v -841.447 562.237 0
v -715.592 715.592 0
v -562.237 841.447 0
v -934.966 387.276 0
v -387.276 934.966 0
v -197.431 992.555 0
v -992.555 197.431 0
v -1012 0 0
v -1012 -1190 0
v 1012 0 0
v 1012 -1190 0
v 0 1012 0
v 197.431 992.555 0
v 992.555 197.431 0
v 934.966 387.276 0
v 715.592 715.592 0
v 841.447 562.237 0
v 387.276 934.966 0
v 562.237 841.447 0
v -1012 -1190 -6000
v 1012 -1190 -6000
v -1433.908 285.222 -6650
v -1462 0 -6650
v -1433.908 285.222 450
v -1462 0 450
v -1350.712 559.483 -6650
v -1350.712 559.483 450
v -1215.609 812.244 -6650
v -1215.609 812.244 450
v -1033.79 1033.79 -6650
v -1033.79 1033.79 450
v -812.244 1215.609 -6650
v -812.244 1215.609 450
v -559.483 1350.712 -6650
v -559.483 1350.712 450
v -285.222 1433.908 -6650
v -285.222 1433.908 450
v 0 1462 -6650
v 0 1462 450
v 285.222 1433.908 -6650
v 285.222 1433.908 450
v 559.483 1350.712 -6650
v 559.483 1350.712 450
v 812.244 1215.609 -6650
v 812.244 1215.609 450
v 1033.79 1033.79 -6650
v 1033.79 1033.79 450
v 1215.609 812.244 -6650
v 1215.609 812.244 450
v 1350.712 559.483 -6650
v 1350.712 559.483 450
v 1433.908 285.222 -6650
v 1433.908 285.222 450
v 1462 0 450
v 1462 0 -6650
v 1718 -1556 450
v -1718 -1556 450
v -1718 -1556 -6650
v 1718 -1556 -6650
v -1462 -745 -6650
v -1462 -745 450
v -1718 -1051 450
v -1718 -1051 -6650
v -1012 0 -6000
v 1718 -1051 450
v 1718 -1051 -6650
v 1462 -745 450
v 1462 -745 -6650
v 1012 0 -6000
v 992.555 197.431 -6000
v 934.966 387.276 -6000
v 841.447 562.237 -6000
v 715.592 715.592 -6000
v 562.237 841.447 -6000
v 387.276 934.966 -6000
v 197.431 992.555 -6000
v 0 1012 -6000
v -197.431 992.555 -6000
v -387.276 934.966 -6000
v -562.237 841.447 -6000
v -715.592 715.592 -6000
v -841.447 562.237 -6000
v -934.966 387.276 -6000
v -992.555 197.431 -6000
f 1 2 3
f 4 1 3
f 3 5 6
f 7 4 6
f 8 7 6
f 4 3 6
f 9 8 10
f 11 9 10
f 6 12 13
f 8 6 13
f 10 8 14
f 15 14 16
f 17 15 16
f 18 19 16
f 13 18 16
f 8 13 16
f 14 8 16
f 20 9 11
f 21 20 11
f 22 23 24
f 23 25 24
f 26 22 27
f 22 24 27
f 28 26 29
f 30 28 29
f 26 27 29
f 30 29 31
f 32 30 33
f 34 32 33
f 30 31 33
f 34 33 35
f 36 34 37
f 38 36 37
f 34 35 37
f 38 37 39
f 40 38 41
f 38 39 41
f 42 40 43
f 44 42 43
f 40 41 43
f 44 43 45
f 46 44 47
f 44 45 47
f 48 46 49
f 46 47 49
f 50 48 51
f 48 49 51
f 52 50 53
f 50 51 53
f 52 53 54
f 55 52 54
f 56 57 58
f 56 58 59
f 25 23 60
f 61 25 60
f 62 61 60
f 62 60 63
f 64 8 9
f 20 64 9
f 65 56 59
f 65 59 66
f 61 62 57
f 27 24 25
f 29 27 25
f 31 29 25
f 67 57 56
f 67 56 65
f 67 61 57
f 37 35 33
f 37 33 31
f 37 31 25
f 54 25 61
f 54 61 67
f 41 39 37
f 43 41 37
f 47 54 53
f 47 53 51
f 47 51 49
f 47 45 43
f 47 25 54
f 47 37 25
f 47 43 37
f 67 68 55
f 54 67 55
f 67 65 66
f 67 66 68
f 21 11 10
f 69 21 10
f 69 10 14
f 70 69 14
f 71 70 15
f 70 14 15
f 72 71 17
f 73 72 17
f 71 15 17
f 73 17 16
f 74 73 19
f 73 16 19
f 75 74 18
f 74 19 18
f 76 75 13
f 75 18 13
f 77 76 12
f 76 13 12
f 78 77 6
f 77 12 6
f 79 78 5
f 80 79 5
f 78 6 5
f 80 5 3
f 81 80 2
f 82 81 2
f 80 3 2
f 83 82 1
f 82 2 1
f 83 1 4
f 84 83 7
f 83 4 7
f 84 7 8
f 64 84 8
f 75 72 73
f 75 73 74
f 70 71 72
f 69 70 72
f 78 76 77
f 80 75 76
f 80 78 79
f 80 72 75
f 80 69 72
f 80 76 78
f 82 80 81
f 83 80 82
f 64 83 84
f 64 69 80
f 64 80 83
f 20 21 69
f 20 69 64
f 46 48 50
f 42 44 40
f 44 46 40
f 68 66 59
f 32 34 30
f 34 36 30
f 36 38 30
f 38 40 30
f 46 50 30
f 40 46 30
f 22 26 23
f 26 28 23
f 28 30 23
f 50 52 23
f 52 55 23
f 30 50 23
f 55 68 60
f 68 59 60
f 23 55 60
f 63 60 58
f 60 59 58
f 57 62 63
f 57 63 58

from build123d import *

# Parameters (mm, degrees)
PAD_DEPTH    = 6000
PAD001_DEPTH = 450
PAD002_DEPTH = 650


with BuildPart() as part:
    # Sketch → Pad (new body)
    with BuildSketch(Plane.XY):
        with BuildLine():
            ThreePointArc((1462, 0), (0, 1462), (-1462, 0))
            Line((-1462, 0), (-1462, -745))
            Line((-1462, -745), (-1718, -1051))
            Line((-1718, -1051), (-1718, -1556))
            Line((-1718, -1556), (1718, -1556))
            Line((1718, -1556), (1718, -1051))
            Line((1718, -1051), (1462, -745))
            Line((1462, -745), (1462, 0))
        make_face()
        with BuildLine():
            ThreePointArc((1012, 0), (0, 1012), (-1012, 0))
            Line((-1012, 0), (-1012, -1190))
            Line((-1012, -1190), (1012, -1190))
            Line((1012, -1190), (1012, 0))
        make_face(mode=Mode.SUBTRACT)
    extrude(amount=-PAD_DEPTH)

    # Sketch001 (on Face13 of Pad) → Pad001 (join)
    with BuildSketch(Plane.XY):
        with BuildLine():
            Line((-1462, 0), (-1462, -745))
            Line((-1462, -745), (-1718, -1051))
            Line((-1718, -1051), (-1718, -1556))
            Line((-1718, -1556), (1718, -1556))
            Line((1718, -1556), (1718, -1051))
            Line((1718, -1051), (1462, -745))
            Line((1462, -745), (1462, 0))
            ThreePointArc((1462, 0), (0, 1462), (-1462, 0))
        make_face()
    extrude(amount=PAD001_DEPTH)

    # Sketch002 (on Face1 of Pad001) → Pad002 (join)
    with BuildSketch(Plane(origin=(0, 0, -6000), x_dir=(1, 0, 0), z_dir=(0, 0, -1))):
        with BuildLine():
            Line((-1462, 0), (-1462, 745))
            Line((-1462, 745), (-1718, 1051))
            Line((-1718, 1051), (-1718, 1556))
            Line((-1718, 1556), (1718, 1556))
            Line((1718, 1556), (1718, 1051))
            Line((1718, 1051), (1462, 745))
            Line((1462, 745), (1462, 0))
            ThreePointArc((-1462, 0), (0, -1462), (1462, 0))
        make_face()
    extrude(amount=PAD002_DEPTH)


solid = part.part
